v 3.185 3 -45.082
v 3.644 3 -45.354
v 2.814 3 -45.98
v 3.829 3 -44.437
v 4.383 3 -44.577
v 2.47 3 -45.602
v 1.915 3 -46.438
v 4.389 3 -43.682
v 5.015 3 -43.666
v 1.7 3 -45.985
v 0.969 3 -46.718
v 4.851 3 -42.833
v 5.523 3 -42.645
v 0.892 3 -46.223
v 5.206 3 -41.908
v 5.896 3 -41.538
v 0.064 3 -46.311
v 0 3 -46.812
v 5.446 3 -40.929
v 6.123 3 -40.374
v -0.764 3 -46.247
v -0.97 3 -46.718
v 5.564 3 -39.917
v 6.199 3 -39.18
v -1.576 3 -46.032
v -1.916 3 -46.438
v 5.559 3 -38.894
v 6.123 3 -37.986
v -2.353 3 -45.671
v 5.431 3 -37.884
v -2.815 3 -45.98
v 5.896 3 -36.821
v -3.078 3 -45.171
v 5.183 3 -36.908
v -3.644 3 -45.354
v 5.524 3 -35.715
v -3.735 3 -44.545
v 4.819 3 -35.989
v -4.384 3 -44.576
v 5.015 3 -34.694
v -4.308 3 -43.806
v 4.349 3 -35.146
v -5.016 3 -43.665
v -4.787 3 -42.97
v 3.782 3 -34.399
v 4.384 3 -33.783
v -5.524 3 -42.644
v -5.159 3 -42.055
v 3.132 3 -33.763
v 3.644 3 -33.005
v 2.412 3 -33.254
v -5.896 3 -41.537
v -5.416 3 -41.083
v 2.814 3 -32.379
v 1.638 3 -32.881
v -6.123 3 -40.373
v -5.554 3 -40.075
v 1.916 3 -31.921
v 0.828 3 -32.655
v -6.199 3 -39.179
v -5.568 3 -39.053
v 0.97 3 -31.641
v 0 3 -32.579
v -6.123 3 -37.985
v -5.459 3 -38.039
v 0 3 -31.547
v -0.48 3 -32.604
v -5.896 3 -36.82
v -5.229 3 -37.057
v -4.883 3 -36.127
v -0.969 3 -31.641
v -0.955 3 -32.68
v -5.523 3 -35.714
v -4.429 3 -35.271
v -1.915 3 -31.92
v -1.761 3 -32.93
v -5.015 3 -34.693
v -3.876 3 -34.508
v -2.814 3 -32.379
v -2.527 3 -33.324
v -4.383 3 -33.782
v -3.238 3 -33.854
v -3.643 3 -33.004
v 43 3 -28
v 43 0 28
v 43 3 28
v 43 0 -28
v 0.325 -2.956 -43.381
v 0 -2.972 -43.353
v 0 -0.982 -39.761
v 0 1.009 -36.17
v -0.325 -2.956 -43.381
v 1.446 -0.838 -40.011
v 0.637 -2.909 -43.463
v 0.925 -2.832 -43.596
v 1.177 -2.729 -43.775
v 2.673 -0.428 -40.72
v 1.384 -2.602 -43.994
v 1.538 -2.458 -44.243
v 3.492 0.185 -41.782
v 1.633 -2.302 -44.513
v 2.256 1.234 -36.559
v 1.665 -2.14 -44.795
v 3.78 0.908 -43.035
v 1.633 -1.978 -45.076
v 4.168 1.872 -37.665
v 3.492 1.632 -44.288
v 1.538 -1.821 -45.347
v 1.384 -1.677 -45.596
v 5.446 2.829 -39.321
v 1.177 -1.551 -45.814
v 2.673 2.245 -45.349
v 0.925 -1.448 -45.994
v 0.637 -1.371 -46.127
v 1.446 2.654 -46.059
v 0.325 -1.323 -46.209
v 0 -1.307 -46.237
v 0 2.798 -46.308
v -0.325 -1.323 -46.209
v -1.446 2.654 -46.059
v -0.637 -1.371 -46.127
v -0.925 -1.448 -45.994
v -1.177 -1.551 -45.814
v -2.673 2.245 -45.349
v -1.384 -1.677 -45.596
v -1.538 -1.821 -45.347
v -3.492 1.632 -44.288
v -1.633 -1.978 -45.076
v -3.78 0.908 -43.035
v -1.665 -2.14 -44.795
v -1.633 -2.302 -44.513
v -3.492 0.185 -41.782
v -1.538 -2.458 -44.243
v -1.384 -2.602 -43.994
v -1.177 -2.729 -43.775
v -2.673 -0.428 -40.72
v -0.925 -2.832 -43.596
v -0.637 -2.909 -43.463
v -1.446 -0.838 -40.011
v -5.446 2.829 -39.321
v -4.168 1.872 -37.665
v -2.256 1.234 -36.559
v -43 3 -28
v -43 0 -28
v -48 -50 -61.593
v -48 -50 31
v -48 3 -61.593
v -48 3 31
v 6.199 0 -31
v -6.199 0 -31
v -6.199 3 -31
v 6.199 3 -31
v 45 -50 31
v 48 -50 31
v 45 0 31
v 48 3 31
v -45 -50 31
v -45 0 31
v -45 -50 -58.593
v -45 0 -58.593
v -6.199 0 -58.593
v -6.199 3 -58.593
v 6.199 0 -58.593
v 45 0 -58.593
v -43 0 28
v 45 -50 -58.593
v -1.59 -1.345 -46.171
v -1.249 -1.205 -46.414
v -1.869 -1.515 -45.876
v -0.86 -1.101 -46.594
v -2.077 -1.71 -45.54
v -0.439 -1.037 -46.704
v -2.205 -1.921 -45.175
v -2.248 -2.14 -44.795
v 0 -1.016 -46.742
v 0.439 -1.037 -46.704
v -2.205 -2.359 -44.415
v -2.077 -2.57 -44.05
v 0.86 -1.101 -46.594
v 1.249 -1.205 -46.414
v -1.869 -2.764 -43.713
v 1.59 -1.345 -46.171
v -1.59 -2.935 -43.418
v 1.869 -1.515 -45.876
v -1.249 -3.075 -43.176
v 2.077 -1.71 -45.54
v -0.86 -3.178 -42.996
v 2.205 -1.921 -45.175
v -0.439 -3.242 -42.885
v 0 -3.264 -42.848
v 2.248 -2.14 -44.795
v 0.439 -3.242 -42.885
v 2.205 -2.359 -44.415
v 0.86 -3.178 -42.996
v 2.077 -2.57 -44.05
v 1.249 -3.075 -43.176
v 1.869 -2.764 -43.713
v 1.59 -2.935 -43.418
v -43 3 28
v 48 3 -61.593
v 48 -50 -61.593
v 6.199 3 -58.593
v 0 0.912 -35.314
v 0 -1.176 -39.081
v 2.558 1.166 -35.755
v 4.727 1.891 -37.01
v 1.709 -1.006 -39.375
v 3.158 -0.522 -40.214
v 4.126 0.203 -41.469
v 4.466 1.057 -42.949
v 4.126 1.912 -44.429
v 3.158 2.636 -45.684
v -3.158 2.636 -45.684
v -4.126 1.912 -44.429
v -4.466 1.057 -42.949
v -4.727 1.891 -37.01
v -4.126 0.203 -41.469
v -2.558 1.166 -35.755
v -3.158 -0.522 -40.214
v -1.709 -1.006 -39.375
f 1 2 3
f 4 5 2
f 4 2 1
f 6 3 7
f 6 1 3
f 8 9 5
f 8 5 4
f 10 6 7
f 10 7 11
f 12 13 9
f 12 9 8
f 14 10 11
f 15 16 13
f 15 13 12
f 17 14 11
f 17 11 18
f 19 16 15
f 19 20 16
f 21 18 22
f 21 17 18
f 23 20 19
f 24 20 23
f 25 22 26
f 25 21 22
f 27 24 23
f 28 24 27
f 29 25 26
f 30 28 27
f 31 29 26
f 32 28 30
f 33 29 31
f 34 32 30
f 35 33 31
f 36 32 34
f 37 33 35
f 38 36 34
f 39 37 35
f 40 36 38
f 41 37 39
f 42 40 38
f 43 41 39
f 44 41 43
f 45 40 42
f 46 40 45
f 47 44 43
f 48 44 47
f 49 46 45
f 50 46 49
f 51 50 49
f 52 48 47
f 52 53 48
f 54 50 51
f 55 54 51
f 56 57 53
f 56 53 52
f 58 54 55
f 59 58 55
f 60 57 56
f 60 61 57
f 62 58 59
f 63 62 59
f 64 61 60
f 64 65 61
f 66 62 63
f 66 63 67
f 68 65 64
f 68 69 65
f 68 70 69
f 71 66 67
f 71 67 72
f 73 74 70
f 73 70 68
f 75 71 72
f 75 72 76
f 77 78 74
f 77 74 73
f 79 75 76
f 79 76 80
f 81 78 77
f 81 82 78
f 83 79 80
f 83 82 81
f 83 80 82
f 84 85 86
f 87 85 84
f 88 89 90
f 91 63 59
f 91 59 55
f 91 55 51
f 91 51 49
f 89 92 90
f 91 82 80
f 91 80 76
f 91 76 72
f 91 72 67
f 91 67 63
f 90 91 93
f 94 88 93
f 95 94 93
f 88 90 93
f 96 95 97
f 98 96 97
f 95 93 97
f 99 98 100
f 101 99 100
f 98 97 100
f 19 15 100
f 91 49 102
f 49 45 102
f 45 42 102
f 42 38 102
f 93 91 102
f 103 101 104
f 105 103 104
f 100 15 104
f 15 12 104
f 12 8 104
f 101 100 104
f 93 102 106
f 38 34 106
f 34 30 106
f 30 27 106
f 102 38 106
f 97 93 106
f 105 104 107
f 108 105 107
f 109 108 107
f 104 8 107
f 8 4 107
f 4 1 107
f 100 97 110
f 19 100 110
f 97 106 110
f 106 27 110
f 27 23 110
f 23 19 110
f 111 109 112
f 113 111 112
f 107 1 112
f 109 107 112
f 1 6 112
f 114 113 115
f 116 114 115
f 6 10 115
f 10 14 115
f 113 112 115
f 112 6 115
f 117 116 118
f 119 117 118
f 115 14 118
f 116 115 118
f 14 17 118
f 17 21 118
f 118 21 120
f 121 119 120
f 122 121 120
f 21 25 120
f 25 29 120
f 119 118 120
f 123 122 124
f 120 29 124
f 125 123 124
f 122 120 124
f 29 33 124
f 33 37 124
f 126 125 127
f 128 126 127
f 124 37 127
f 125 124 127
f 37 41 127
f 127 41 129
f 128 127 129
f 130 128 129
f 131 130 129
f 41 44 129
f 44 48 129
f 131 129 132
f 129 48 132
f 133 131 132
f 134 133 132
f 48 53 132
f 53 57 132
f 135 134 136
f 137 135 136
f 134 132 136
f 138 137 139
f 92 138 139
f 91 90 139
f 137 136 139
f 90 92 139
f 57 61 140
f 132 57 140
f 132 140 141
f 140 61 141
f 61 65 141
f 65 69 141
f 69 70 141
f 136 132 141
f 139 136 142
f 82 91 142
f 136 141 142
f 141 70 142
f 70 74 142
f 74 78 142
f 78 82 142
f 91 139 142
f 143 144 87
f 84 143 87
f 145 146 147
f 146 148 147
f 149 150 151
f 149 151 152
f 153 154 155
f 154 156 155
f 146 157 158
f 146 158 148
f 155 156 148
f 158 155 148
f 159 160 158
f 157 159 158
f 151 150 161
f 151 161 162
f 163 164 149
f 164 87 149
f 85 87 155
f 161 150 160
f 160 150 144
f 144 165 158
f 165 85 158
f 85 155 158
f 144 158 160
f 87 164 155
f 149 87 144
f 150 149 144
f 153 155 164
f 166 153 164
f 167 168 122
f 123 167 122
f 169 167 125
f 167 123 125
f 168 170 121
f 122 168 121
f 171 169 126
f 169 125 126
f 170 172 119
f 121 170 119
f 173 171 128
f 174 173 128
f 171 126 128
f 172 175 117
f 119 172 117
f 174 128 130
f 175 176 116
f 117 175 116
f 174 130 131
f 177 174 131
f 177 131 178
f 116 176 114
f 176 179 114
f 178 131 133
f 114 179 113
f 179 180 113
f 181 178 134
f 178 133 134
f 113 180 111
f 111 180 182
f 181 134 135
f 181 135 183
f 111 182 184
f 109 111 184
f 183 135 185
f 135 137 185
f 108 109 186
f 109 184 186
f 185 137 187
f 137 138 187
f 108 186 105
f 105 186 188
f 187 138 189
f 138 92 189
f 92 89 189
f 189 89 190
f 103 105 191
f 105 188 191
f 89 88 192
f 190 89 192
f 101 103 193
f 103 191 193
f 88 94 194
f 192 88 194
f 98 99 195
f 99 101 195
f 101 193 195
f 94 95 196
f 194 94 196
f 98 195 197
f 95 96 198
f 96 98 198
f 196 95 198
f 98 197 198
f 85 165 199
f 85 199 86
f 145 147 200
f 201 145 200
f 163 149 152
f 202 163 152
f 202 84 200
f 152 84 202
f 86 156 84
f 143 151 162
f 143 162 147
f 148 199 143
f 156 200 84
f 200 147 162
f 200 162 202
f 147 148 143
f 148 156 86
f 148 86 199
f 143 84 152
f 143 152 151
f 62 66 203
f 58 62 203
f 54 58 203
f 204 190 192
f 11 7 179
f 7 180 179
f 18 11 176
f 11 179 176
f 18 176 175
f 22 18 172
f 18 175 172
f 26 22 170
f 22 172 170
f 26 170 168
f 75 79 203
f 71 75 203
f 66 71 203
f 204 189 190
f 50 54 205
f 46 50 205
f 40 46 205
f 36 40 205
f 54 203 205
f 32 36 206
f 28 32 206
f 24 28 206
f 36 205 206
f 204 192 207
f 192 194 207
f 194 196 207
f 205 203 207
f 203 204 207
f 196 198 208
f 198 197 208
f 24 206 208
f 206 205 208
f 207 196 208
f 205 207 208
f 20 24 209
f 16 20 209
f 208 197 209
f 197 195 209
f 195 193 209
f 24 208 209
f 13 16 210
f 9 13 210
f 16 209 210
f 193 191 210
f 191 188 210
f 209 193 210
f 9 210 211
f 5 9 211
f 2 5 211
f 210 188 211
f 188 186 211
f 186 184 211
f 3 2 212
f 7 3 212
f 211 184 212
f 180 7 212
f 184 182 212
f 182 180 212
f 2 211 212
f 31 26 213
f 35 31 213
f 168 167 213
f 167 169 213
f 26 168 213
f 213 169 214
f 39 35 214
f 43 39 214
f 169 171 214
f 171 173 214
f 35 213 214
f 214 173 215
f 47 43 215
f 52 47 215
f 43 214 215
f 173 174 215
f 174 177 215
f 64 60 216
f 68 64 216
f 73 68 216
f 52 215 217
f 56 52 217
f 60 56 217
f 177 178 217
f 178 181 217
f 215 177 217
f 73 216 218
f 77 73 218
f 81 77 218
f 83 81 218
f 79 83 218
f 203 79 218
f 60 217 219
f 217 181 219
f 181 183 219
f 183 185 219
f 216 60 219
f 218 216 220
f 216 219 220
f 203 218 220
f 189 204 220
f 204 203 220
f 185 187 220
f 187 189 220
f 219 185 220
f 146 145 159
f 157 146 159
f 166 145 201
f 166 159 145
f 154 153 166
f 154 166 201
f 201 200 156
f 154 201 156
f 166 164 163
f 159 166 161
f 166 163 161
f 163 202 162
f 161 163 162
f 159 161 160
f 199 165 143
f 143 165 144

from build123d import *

# Parameters (mm, degrees)
SKETCH1_W               = 96
SKETCH1_H               = 62
SKETCH1_W_2             = 86
SKETCH1_H_2             = 56
BOSS_EXTRUDE1_DEPTH     = 3
CUT_EXTRUDE1_DEPTH      = 80.713392874
CUT_EXTRUDE1_DEPTH_BACK = 80.713392874
SKETCH6_W               = 96
SKETCH6_H               = 13.293726608
SKETCH8_W               = 41.800696096
SKETCH8_H               = 3
BOSS_EXTRUDE2_DEPTH     = 27.592766
SKETCH9_W               = 41.800696096
SKETCH9_H               = 3
SKETCH9_W_2             = 12.398607808
BOSS_EXTRUDE3_DEPTH     = 3
BOSS_EXTRUDE4_DEPTH     = 50


with BuildPart() as part:
    # Sketch1 → Boss-Extrude1 (new body)
    with BuildSketch(Plane(origin=(0, 0, 0), x_dir=(1, 0, 0), z_dir=(0, 1, 0))):
        Rectangle(SKETCH1_W, SKETCH1_H)
        Rectangle(SKETCH1_W_2, SKETCH1_H_2, mode=Mode.SUBTRACT)
    extrude(amount=BOSS_EXTRUDE1_DEPTH)

    # Sketch8 → Boss-Extrude2 (add)
    with BuildSketch(Plane(origin=(0, 0, -31), x_dir=(-1, 0, 0), z_dir=(0, 0, -1))):
        with Locations((-27.099651952, 1.5)):
            Rectangle(SKETCH8_W, SKETCH8_H)
        with Locations((27.099651952, 1.5)):
            Rectangle(SKETCH8_W, SKETCH8_H)
    extrude(amount=BOSS_EXTRUDE2_DEPTH)


with BuildPart() as body_2:
    # Sketch5 → Revolve4 (revolve)
    with BuildSketch(Plane(origin=(0, 0, 0), x_dir=(0, 0, -1), z_dir=(1, 0, 0))):
        Polygon((42.847766111, -3.264000825), (43.35293319, -2.972342476), (32.435517398, 3.079279916), (29.397254743, 4.191739373), align=None)
    revolve(axis=Axis((0, -3.698755296, -45.694749278), (0, 0.8660254037844369, 0.500000000000003)))

    # Sketch6 → Cut-Extrude1 (cut, two sides: drawn at the far end of the back side and taken through both)
    with BuildSketch(Plane(origin=(0, 0, -31), x_dir=(-1, 0, 0), z_dir=(0, 0, -1)).offset(-CUT_EXTRUDE1_DEPTH_BACK)):
        with Locations((0, 9.646863304)):
            Rectangle(SKETCH6_W, SKETCH6_H)
    extrude(amount=CUT_EXTRUDE1_DEPTH + CUT_EXTRUDE1_DEPTH_BACK, mode=Mode.SUBTRACT)


with BuildPart() as boss_extrude3_tool:
    # Sketch9 → Boss-Extrude3 (new body)
    with BuildSketch(Plane(origin=(0, 0, -58.59276647), x_dir=(-1, 0, 0), z_dir=(0, 0, -1))):
        with Locations((27.099651952, 1.5)):
            Rectangle(SKETCH9_W, SKETCH9_H)
        with Locations((0, 1.5)):
            Rectangle(SKETCH9_W_2, SKETCH9_H)
        with Locations((-27.099651952, 1.5)):
            Rectangle(SKETCH9_W, SKETCH9_H)
    extrude(amount=BOSS_EXTRUDE3_DEPTH)


with BuildPart() as part_1:
    add(part.part)


with BuildPart() as part_2:
    # Boss-Extrude3: joined with boss_extrude3_tool
    add(part_1.part.fuse(boss_extrude3_tool.part, tol=0.00001))

    # Sketch10 → Boss-Extrude4 (add)
    with BuildSketch(Plane.XZ):
        Polygon((48, -61.59276647), (48, 31), (45, 31), (45, -58.59276647), (-45, -58.59276647), (-45, 31), (-48, 31), (-48, -61.59276647), align=None)
    extrude(amount=BOSS_EXTRUDE4_DEPTH)


solid = Compound([body_2.part, part_2.part])
